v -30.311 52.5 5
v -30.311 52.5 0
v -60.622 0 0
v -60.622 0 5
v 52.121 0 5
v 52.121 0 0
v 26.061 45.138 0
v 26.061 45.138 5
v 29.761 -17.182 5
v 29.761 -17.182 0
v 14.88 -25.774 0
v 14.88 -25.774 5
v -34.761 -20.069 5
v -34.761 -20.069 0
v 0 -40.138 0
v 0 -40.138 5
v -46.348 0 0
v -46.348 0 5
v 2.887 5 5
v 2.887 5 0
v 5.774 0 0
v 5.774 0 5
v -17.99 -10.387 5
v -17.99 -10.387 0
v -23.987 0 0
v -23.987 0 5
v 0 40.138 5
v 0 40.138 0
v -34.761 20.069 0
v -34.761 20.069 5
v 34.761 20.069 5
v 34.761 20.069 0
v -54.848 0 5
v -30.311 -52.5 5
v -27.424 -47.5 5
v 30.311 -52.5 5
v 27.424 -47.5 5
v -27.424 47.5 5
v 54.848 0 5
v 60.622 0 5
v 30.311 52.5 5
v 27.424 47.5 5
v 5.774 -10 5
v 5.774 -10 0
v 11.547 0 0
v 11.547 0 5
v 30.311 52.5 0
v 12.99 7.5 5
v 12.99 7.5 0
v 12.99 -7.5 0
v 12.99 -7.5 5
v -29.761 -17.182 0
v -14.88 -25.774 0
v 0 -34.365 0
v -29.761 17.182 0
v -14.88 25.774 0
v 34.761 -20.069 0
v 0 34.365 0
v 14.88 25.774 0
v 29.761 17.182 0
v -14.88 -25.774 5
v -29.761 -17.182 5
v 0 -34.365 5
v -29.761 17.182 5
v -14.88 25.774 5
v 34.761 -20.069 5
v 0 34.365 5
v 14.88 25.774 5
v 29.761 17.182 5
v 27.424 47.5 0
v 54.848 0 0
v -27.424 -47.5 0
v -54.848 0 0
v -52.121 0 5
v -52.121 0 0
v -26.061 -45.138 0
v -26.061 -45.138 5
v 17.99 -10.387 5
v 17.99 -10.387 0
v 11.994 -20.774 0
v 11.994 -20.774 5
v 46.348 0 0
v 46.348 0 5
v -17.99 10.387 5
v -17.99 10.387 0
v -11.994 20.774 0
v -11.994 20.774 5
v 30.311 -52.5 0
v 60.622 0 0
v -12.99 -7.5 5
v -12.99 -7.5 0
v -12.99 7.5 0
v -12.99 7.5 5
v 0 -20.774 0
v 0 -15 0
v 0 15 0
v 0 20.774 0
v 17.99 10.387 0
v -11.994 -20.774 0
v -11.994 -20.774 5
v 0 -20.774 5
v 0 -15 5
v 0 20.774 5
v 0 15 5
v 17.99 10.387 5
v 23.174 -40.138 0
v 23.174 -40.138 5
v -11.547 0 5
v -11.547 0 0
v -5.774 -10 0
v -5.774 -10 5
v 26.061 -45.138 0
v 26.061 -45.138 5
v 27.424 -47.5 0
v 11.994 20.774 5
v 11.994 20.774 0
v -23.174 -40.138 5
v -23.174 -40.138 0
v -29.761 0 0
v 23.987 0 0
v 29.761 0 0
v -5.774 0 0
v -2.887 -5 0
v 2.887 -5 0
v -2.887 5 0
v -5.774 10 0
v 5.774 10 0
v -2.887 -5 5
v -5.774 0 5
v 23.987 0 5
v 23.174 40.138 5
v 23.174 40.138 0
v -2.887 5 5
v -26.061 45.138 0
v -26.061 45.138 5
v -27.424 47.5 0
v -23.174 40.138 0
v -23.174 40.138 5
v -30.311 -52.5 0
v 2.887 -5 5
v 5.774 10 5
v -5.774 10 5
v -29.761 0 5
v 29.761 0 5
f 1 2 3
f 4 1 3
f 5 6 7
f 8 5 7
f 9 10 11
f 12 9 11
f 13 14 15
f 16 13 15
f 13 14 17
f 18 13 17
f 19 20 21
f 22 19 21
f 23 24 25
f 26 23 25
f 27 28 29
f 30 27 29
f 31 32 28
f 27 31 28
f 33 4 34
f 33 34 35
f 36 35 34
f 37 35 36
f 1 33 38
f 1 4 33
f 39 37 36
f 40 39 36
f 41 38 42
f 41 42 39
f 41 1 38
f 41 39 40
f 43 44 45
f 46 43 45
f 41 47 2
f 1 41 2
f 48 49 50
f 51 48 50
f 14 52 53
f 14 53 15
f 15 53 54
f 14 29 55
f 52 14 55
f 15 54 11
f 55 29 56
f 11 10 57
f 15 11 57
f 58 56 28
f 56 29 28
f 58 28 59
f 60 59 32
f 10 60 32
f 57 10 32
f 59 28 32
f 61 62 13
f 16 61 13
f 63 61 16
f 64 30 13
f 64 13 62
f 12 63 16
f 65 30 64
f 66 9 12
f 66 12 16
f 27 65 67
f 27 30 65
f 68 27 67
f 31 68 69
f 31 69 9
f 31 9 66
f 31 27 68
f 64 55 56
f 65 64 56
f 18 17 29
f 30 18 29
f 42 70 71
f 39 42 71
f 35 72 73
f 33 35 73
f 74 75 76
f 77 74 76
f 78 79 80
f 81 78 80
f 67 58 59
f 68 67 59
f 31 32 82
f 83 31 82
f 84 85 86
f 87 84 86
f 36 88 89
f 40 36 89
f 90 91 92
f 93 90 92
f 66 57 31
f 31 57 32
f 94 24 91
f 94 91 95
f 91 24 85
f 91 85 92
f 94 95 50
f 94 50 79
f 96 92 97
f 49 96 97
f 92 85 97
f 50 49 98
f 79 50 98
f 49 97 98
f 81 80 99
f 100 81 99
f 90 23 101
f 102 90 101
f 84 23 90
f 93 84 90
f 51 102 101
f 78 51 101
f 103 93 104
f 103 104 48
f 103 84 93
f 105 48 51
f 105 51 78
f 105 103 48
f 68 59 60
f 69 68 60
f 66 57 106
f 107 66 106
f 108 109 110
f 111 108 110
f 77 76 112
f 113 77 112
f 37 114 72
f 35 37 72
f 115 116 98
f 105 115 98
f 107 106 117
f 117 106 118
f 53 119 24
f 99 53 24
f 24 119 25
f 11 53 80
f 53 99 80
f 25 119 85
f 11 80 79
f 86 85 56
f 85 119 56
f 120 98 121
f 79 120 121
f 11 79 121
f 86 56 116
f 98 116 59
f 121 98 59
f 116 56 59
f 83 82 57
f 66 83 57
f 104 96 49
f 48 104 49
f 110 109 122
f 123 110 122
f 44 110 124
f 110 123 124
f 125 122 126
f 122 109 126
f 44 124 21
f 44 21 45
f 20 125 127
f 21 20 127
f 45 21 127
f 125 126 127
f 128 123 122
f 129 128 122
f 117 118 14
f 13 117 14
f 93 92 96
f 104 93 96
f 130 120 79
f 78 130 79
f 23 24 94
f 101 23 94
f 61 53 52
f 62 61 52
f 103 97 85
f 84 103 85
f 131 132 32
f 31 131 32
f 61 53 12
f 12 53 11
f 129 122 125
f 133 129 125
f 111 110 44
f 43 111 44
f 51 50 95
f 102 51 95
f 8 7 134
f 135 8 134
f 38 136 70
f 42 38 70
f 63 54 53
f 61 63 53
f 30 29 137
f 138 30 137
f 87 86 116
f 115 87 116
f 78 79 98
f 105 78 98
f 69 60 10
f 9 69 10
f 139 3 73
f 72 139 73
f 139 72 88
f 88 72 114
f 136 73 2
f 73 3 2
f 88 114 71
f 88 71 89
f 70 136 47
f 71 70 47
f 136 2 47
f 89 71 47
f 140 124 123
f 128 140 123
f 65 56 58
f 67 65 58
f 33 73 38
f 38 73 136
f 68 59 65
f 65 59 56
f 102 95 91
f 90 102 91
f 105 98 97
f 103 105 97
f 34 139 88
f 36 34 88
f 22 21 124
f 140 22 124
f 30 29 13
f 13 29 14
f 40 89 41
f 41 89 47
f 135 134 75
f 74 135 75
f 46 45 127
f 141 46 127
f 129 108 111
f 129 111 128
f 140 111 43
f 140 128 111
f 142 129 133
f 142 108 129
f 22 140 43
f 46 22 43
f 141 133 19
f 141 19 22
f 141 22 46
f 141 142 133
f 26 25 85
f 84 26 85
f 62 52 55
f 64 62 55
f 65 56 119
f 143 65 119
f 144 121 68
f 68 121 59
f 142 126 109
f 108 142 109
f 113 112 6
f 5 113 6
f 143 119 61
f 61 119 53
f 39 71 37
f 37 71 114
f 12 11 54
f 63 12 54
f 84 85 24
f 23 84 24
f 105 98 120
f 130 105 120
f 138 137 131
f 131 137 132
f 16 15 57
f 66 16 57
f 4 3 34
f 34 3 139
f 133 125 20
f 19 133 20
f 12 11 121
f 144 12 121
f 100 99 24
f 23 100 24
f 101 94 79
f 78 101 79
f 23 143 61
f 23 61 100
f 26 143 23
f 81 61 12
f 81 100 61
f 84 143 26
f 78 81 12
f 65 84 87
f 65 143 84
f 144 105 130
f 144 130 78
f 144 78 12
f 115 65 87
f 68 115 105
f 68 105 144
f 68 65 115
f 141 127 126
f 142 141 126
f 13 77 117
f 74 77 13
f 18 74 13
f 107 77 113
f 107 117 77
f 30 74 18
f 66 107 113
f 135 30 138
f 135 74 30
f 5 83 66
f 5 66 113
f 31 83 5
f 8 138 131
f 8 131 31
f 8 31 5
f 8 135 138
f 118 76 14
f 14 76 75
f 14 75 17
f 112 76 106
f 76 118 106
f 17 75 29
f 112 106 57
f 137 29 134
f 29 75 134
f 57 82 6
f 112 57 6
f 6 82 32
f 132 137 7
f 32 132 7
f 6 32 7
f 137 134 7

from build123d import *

# Parameters (mm, degrees)
F1_DEPTH = 5


with BuildPart() as f1:
    # F0 (on Top) → F1 (new body)
    with BuildSketch(Plane.XY):
        Polygon((0, 40.1381732757), (-34.7606777183, 20.0690866379), (-34.7606777183, -20.0690866379), (0, -40.1381732757), (34.7606777183, -20.0690866379), (34.7606777183, 20.0690866379), align=None)
        Polygon((-29.7606777183, -17.1823352919), (-29.7606777183, 0), (-29.7606777183, 17.1823352919), (-14.8803388591, 25.7735029379), (0, 34.3646705838), (14.8803388591, 25.7735029379), (29.7606777183, 17.1823352919), (29.7606777183, 0), (29.7606777183, -17.1823352919), (14.8803388591, -25.7735029379), (0, -34.3646705838), (-14.8803388591, -25.7735029379), align=None, mode=Mode.SUBTRACT)
    extrude(amount=F1_DEPTH)


with BuildPart() as f1b:
    # F0 (on Top) → F1, piece 2 (new body)
    with BuildSketch(Plane.XY):
        Polygon((-14.8803387171, 25.7735026919), (-29.7606774343, 0), (-14.8803387171, -25.7735026919), (14.8803387171, -25.7735026919), (29.7606774343, 0), (14.8803387171, 25.7735026919), align=None)
        Polygon((-23.9871747424, 0), (-17.9903810568, 10.3867513459), (-11.9935873712, 20.7735026919), (0, 20.7735026919), (11.9935873712, 20.7735026919), (17.9903810568, 10.3867513459), (23.9871747424, 0), (17.9903810568, -10.3867513459), (11.9935873712, -20.7735026919), (0, -20.7735026919), (-11.9935873712, -20.7735026919), (-17.9903810568, -10.3867513459), align=None, mode=Mode.SUBTRACT)
    extrude(amount=F1_DEPTH)


with BuildPart() as f1c:
    # F0 (on Top) → F1, piece 3 (new body)
    with BuildSketch(Plane.XY):
        Polygon((0, 20.7735026919), (-17.9903810568, 10.3867513459), (-17.9903810568, -10.3867513459), (0, -20.7735026919), (17.9903810568, -10.3867513459), (17.9903810568, 10.3867513459), align=None)
        Polygon((0, 15), (12.9903810568, 7.5), (12.9903810568, -7.5), (0, -15), (-12.9903810568, -7.5), (-12.9903810568, 7.5), align=None, mode=Mode.SUBTRACT)
    extrude(amount=F1_DEPTH)


with BuildPart() as f1d:
    # F0 (on Top) → F1, piece 4 (new body)
    with BuildSketch(Plane.XY):
        Polygon((-5.7735026919, 10), (-11.5470053838, 0), (-5.7735026919, -10), (5.7735026919, -10), (11.5470053838, 0), (5.7735026919, 10), align=None)
        Polygon((-5.7735026919, 0), (-2.8867513459, 5), (2.8867513459, 5), (5.7735026919, 0), (2.8867513459, -5), (-2.8867513459, -5), align=None, mode=Mode.SUBTRACT)
    extrude(amount=F1_DEPTH)


with BuildPart() as f1e:
    # F0 (on Top) → F1, piece 5 (new body)
    with BuildSketch(Plane.XY):
        Polygon((52.1210729829, 0), (26.0605364915, 45.1381732757), (-26.0605364915, 45.1381732757), (-52.1210729829, 0), (-26.0605364915, -45.1381732757), (26.0605364915, -45.1381732757), align=None)
        Polygon((-46.3475702911, 0), (-34.7606777183, 20.0690866379), (-23.1737851455, 40.1381732757), (0, 40.1381732757), (23.1737851455, 40.1381732757), (34.7606777183, 20.0690866379), (46.3475702911, 0), (34.7606777183, -20.0690866379), (23.1737851455, -40.1381732757), (0, -40.1381732757), (-23.1737851455, -40.1381732757), (-34.7606777183, -20.0690866379), align=None, mode=Mode.SUBTRACT)
    extrude(amount=F1_DEPTH)


with BuildPart() as f1f:
    # F0 (on Top) → F1, piece 6 (new body)
    with BuildSketch(Plane.XY):
        Polygon((-30.3108891325, 52.5), (-60.6217782649, 0), (-30.3108891325, -52.5), (30.3108891325, -52.5), (60.6217782649, 0), (30.3108891325, 52.5), align=None)
        Polygon((-54.848275573, 0), (-27.4241377865, 47.5), (27.4241377865, 47.5), (54.848275573, 0), (27.4241377865, -47.5), (-27.4241377865, -47.5), align=None, mode=Mode.SUBTRACT)
    extrude(amount=F1_DEPTH)


solid = Compound([f1.part, f1b.part, f1c.part, f1d.part, f1e.part, f1f.part])
